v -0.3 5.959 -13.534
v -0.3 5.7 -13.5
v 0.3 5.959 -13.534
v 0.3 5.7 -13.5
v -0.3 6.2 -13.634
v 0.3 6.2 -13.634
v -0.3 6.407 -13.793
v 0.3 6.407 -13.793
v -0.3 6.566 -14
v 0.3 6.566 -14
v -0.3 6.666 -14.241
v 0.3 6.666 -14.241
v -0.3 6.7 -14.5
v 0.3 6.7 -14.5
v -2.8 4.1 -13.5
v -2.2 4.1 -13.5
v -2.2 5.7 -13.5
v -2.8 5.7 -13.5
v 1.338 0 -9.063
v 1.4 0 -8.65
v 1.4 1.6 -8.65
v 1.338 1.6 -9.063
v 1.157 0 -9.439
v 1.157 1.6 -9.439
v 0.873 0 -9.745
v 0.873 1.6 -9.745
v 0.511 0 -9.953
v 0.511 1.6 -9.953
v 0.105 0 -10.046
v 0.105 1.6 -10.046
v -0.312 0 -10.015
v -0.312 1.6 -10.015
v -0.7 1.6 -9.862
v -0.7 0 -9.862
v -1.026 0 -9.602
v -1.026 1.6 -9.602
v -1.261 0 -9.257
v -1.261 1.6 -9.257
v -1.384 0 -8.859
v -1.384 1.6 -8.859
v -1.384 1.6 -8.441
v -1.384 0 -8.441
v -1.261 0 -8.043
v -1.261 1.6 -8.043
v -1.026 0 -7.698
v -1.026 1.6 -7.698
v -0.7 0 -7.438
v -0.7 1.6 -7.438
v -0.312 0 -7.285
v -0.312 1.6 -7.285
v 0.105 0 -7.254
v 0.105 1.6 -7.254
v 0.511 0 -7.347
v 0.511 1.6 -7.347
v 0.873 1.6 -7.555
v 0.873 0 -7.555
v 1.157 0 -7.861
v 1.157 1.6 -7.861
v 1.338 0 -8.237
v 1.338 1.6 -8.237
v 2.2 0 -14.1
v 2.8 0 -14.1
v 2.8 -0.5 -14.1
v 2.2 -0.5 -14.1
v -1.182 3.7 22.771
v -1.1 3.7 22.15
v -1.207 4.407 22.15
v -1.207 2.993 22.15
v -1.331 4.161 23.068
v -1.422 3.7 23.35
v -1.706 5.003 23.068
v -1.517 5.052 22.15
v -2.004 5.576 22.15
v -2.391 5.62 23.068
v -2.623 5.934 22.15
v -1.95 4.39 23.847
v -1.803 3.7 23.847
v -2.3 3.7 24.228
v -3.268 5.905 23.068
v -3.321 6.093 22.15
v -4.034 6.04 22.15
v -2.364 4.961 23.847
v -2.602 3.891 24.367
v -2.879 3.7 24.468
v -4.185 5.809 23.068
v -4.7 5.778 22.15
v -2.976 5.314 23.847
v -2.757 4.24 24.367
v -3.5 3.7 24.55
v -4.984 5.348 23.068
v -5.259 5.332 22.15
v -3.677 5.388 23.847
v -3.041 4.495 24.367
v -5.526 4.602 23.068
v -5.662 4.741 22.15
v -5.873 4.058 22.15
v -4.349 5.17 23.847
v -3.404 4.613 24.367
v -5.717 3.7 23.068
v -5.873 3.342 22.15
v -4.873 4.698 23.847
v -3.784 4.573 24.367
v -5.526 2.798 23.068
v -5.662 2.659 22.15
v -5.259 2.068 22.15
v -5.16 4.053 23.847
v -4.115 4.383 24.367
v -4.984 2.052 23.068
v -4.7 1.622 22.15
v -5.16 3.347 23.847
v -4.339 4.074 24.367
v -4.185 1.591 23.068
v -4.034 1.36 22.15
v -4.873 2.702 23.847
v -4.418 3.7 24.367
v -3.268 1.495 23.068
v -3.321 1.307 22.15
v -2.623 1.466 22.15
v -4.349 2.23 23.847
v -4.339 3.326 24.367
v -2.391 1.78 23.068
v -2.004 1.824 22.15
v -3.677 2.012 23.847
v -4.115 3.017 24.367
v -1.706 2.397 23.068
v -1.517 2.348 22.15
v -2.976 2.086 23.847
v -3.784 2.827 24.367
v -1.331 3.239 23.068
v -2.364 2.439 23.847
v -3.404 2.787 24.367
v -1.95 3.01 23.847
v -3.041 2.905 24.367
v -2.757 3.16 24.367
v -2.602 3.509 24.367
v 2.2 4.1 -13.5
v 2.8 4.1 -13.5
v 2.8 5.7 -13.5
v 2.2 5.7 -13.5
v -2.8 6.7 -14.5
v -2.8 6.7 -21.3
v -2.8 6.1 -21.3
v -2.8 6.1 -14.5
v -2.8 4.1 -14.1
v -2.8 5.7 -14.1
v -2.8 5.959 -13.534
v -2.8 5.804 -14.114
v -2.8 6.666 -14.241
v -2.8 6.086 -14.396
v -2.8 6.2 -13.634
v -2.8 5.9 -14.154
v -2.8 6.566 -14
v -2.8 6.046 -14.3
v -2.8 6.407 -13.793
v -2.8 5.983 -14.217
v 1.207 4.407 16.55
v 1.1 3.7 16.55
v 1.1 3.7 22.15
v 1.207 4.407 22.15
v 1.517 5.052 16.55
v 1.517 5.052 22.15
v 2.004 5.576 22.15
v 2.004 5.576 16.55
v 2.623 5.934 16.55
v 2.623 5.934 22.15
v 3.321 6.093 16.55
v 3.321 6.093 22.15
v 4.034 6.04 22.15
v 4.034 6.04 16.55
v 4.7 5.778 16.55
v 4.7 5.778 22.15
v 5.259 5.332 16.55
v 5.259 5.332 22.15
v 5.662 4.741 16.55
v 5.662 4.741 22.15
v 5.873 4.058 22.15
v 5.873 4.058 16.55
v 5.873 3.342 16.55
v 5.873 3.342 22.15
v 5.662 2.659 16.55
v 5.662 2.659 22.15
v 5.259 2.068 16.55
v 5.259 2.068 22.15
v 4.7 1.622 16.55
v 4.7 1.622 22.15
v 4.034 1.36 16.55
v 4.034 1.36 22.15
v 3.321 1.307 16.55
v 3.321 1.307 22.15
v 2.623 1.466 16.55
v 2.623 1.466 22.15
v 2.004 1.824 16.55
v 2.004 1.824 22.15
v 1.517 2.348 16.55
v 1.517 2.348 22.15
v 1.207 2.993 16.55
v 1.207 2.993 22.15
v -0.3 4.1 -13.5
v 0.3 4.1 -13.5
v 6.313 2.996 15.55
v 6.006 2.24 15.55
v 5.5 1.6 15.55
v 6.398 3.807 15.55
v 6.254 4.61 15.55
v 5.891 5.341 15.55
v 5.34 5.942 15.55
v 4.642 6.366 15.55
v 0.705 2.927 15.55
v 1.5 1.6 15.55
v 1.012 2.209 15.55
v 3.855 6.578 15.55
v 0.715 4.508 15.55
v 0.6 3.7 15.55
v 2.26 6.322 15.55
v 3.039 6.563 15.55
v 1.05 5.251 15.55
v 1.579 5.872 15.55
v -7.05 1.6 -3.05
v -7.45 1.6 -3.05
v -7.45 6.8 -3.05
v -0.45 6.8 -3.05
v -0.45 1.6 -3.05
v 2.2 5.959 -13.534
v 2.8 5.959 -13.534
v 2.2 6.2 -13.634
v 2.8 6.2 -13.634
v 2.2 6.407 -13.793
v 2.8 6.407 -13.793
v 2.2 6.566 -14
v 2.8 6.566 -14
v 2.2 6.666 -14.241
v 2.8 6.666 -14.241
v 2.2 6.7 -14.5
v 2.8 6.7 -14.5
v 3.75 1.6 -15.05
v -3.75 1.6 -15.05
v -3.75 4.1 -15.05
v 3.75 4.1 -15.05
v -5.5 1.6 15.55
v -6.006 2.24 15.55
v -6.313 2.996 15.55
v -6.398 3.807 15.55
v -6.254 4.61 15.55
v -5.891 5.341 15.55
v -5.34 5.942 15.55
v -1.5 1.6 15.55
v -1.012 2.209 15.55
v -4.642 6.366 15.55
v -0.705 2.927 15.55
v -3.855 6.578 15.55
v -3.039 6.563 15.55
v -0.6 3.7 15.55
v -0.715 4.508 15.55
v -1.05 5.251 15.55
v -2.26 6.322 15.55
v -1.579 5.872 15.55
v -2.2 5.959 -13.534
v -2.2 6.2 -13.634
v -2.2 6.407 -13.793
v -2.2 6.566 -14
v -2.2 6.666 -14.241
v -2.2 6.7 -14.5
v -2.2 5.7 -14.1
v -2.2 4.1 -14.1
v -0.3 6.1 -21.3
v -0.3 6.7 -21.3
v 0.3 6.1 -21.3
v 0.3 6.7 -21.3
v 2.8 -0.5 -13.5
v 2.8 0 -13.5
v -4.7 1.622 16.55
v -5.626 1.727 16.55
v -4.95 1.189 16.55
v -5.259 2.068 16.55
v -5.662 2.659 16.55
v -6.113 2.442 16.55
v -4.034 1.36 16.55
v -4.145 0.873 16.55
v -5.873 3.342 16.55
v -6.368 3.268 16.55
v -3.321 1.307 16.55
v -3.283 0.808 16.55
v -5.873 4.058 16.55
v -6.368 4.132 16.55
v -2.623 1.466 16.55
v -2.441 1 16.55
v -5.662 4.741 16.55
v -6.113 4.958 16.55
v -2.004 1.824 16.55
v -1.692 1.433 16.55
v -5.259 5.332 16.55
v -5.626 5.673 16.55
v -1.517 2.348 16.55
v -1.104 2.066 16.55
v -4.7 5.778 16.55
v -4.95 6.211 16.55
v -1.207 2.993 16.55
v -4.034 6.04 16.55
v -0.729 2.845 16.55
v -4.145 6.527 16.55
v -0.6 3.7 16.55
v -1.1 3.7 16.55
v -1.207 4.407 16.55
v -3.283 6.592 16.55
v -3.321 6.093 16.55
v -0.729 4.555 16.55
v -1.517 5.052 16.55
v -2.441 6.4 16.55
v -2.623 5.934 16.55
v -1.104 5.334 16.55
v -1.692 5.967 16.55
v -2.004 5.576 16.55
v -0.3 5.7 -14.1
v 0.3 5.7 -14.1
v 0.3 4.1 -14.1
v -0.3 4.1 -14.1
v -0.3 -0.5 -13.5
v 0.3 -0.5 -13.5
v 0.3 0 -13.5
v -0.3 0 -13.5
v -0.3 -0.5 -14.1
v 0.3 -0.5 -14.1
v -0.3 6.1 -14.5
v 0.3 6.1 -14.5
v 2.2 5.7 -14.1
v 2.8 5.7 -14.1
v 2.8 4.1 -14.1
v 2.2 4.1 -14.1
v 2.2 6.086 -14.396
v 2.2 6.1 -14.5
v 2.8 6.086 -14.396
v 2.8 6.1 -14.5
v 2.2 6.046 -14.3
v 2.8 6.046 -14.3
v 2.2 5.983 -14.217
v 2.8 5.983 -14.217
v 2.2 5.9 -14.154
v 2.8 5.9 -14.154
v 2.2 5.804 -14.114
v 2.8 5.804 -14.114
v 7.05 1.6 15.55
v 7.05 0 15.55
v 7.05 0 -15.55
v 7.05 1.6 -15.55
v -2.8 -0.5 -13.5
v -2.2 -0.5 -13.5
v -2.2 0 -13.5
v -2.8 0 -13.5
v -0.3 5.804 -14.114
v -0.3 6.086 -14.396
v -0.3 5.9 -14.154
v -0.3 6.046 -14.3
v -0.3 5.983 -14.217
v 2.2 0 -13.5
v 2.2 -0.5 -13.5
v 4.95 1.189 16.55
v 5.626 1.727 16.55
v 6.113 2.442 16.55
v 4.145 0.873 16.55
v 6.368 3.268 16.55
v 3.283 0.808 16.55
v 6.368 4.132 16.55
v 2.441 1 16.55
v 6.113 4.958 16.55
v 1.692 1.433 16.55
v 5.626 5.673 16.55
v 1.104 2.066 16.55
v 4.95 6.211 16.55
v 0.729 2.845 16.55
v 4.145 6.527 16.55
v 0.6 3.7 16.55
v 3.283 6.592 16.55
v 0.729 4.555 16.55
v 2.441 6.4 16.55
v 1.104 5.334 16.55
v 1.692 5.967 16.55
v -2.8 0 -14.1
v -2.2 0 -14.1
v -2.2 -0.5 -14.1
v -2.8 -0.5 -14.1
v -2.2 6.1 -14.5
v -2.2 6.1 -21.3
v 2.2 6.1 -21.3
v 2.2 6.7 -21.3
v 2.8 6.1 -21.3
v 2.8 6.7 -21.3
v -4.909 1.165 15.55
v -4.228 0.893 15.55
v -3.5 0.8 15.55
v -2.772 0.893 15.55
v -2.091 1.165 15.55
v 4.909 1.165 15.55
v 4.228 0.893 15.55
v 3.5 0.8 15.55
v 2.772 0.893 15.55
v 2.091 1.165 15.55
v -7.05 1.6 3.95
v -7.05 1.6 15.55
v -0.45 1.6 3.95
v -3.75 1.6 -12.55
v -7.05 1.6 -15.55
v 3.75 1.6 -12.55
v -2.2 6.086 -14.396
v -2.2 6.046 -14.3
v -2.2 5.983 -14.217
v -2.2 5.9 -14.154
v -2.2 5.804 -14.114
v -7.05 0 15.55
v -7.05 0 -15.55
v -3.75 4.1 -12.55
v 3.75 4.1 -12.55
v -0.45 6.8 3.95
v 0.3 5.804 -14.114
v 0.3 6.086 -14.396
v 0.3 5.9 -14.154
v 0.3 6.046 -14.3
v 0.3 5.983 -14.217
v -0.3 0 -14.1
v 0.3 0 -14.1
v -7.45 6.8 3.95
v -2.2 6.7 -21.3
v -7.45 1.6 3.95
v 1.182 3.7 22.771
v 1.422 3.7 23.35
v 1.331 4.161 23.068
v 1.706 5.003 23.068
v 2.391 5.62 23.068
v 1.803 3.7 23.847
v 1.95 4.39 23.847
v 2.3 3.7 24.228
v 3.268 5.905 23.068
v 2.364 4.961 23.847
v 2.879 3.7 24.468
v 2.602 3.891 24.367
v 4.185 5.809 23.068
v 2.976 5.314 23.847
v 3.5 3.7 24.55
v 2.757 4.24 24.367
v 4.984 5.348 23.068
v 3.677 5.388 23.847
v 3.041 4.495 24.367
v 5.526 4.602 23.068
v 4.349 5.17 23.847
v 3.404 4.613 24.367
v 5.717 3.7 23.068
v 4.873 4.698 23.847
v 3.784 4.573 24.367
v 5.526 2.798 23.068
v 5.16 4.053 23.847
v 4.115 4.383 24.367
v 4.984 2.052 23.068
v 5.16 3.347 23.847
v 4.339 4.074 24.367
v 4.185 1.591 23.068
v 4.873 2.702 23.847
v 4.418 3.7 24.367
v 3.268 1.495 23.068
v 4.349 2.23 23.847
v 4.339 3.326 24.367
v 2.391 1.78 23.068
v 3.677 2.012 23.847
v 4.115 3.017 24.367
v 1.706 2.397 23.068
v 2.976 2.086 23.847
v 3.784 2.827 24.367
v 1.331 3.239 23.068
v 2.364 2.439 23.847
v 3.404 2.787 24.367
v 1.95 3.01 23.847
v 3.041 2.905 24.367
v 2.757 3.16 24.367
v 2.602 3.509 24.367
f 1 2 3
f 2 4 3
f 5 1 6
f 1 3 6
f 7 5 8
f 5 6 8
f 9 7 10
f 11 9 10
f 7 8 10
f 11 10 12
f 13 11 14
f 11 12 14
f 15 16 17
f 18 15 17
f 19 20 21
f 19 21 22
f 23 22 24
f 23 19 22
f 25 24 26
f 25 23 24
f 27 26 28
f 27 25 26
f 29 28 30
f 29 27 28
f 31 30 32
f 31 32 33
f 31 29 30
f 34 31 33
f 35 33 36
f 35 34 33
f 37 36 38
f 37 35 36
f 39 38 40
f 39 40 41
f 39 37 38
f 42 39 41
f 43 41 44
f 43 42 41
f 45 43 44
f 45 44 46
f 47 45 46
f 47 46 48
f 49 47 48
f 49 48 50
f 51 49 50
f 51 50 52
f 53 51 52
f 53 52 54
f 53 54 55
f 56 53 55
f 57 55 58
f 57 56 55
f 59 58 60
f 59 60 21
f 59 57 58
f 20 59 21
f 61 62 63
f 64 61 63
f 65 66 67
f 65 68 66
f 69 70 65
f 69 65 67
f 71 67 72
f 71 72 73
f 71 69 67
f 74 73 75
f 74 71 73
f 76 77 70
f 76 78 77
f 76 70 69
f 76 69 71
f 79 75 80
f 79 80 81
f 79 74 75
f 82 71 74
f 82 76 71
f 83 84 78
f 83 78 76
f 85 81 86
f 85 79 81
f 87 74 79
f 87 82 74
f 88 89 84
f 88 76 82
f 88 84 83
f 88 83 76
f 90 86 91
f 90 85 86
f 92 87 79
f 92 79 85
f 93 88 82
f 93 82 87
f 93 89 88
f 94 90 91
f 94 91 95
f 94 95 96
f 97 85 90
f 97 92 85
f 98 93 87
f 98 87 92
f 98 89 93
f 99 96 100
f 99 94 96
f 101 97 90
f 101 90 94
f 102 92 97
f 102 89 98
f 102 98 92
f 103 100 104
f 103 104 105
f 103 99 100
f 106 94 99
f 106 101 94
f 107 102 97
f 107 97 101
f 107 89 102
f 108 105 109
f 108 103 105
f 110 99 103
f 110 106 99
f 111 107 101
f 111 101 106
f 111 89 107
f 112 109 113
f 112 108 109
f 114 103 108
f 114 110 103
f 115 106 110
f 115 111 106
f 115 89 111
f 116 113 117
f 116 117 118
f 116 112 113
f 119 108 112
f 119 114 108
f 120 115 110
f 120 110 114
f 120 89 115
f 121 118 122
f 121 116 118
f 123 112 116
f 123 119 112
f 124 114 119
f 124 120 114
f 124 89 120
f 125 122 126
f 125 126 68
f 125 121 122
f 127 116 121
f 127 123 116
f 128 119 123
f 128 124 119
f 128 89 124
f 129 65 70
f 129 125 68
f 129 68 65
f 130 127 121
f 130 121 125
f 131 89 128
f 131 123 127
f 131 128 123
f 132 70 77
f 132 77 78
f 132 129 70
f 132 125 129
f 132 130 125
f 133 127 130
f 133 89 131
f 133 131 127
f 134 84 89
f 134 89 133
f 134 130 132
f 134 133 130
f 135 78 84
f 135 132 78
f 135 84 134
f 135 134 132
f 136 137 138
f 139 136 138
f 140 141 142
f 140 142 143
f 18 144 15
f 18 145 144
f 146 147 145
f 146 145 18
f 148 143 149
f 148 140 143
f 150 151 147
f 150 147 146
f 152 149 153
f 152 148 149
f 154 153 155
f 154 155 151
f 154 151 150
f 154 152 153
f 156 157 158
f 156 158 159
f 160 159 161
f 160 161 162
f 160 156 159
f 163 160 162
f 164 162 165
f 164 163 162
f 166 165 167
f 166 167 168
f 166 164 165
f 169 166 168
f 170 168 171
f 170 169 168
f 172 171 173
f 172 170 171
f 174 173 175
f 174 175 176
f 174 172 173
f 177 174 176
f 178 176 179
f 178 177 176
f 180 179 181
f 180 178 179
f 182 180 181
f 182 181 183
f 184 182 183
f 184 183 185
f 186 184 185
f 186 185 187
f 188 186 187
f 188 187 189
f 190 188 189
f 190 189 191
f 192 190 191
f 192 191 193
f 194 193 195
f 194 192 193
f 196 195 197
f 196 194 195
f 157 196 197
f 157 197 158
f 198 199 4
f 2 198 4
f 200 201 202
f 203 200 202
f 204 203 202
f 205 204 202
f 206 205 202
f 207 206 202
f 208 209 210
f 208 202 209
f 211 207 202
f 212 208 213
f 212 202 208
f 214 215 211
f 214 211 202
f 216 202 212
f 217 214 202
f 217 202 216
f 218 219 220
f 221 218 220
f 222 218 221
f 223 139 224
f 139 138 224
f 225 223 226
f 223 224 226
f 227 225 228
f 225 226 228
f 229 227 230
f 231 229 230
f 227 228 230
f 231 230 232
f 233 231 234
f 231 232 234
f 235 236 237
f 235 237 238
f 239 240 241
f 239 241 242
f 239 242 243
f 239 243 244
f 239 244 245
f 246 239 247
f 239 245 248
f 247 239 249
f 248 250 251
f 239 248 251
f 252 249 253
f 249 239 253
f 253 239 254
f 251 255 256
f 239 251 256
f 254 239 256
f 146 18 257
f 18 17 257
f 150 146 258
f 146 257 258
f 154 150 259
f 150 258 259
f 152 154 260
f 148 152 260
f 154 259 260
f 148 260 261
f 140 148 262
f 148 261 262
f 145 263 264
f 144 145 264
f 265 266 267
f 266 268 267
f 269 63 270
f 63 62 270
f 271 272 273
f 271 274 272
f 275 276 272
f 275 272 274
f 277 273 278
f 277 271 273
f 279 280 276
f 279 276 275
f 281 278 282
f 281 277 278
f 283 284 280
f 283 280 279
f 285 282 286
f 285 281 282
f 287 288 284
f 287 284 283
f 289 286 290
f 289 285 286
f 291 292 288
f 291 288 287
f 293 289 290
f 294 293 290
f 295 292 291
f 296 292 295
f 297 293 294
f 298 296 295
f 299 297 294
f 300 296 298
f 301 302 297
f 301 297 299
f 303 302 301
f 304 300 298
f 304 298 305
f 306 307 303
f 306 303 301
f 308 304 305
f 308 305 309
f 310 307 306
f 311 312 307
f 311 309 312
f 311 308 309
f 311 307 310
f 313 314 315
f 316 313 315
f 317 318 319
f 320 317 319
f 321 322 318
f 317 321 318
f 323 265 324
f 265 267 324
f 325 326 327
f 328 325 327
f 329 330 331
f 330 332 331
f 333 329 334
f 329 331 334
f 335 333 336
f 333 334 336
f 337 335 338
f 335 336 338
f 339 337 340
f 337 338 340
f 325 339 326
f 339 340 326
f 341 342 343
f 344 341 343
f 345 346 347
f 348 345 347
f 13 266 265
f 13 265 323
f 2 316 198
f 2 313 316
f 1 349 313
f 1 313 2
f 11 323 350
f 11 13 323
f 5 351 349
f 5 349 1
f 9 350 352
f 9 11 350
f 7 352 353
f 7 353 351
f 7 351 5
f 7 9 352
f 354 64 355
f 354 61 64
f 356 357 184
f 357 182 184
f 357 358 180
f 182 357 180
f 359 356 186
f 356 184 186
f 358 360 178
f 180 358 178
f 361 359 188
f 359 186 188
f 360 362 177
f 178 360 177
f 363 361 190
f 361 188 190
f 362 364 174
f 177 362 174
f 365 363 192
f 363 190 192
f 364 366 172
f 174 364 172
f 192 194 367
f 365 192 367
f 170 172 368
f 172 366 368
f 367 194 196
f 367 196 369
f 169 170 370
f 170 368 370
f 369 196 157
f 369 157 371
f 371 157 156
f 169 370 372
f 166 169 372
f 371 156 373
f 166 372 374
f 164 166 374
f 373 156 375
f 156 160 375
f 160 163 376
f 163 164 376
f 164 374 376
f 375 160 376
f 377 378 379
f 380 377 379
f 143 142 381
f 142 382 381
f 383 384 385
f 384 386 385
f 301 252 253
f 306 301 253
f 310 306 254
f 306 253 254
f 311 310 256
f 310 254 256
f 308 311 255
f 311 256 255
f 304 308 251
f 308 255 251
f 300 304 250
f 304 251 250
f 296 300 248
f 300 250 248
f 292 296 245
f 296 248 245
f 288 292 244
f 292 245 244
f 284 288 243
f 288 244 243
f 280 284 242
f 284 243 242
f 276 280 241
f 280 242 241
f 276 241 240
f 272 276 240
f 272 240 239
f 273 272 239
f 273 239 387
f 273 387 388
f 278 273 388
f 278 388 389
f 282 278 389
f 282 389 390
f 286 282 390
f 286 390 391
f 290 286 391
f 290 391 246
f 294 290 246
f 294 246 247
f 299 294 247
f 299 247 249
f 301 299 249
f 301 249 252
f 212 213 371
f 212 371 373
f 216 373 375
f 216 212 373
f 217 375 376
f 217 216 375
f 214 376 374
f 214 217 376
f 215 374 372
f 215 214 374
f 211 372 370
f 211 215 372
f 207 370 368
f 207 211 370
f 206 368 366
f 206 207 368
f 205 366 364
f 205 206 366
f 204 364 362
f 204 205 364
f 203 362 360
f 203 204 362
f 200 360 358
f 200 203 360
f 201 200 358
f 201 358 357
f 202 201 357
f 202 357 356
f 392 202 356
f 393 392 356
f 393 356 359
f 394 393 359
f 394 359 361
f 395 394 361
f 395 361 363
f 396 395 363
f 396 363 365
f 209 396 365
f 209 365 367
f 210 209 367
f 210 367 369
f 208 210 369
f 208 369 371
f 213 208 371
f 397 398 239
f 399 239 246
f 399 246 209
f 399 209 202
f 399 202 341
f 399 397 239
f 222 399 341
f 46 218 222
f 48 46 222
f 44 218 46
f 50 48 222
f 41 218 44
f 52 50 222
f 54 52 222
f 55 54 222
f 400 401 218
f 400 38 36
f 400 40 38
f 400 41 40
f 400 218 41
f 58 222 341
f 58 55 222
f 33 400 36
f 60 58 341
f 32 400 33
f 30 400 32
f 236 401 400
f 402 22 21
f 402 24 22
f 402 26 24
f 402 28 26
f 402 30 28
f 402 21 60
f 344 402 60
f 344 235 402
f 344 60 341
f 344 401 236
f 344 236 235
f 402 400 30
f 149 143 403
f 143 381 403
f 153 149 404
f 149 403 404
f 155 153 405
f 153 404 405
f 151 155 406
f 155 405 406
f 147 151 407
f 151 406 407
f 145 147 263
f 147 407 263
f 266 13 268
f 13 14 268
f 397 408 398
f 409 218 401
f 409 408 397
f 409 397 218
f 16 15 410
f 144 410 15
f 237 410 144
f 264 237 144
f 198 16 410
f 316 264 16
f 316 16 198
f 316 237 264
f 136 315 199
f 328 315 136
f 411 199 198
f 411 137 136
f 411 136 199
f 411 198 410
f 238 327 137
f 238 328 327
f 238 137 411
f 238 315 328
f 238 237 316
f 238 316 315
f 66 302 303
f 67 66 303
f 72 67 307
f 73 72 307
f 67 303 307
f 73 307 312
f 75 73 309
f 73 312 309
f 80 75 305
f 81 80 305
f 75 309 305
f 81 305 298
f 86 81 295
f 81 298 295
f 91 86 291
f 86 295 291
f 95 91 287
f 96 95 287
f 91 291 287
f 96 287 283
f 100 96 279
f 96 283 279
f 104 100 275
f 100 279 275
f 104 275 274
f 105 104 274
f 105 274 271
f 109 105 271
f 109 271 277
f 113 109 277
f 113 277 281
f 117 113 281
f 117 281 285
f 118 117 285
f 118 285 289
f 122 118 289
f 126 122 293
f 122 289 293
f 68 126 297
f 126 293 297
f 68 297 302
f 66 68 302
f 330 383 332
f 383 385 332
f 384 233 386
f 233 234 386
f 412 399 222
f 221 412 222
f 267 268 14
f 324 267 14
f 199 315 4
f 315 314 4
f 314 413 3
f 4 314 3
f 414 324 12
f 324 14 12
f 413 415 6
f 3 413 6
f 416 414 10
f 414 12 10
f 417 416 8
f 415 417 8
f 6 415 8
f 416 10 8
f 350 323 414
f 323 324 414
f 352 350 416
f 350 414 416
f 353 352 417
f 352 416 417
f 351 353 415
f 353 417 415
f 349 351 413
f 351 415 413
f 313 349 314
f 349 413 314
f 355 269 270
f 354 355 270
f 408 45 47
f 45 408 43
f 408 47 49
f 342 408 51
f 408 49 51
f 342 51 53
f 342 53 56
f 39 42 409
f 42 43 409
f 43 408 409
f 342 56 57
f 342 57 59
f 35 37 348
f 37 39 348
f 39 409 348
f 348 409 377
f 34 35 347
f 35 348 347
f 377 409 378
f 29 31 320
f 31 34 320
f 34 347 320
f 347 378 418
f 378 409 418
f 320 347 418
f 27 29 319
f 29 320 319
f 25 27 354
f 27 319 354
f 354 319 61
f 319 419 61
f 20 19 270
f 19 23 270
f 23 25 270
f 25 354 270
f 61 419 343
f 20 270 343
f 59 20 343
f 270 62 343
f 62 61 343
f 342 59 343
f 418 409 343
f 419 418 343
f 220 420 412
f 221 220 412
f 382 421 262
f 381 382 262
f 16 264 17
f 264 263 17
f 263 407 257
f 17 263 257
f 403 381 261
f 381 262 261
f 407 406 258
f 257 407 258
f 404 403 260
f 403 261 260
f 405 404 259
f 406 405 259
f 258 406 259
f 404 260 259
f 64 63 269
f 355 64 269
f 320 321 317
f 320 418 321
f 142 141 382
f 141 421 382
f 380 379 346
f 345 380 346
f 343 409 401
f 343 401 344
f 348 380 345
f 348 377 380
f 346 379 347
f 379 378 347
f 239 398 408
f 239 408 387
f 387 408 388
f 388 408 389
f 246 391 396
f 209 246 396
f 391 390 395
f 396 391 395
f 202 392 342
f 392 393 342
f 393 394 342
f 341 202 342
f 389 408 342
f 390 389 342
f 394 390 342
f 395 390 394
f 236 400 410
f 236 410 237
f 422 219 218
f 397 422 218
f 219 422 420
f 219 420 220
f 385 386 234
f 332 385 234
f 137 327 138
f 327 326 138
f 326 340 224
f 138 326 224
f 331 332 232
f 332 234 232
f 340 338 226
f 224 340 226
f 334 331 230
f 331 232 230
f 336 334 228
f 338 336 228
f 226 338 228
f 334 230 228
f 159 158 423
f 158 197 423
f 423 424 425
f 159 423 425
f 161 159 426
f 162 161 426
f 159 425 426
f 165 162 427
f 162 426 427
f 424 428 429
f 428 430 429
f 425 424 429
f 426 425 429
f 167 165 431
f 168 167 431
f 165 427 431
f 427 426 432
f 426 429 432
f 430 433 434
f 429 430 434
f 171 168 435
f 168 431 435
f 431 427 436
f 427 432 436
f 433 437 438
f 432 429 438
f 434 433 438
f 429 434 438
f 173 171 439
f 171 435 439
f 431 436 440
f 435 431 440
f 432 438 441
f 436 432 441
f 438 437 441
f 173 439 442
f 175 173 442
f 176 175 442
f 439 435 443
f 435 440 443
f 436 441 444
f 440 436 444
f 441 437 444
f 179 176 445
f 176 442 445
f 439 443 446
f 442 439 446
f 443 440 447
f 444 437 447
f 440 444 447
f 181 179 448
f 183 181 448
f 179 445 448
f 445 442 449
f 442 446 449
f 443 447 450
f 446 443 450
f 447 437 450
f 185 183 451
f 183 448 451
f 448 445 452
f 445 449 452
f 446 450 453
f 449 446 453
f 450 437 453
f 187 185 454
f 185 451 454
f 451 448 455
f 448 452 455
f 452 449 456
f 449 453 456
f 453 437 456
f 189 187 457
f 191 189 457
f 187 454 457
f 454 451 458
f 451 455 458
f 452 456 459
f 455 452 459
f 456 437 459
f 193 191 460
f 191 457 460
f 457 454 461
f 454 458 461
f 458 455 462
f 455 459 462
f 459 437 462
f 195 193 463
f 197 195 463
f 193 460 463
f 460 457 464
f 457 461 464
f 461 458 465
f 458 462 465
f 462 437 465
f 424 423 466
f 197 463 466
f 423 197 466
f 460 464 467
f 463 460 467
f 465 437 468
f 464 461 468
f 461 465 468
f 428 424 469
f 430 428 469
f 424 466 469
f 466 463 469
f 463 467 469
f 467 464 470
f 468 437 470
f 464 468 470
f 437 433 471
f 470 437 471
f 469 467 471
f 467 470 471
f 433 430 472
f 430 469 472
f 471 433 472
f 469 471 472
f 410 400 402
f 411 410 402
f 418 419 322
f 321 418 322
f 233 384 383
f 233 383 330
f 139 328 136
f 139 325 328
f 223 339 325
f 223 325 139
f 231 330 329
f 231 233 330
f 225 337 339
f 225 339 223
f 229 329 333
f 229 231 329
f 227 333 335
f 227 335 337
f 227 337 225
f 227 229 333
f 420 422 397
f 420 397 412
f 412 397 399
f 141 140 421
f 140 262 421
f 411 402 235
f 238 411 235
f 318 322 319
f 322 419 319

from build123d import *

# Parameters (mm, degrees)
SKETCH_1_W                 = 14.1
SKETCH_1_H                 = 31.1
SKETCH_1_R                 = 1.4
EXTRUDE_1_DEPTH            = 1.6
SKETCH_2_R                 = 2.9
EXTRUDE_2_DEPTH            = 1
SKETCH_3_R                 = 2.4
EXTRUDE_3_DEPTH            = 8
FILLET_1_R                 = 2.4
FILLET_1_OF_MIRROR_1_R     = 2.4
SKETCH_4_W                 = 7
SKETCH_4_H                 = 7
EXTRUDE_4_DEPTH            = 5.2
SKETCH_5_W                 = 2.5
SKETCH_5_H                 = 2.5
EXTRUDE_5_DEPTH            = 2.5
EXTRUDE_6_DEPTH            = 0.3
PATTERN_LINEAR_1_COUNT     = 2
PATTERN_LINEAR_1_PITCH     = 2.5
PATTERN_LINEAR_1_COL_COUNT = 2
PATTERN_LINEAR_1_COL_PITCH = 2.5


with BuildPart() as part:
    # 草图1 → 凸台-拉伸1 (new body)
    with BuildSketch(Plane(origin=(0, 0, 0), x_dir=(1, 0, 0), z_dir=(0, 1, 0))):
        Rectangle(SKETCH_1_W, SKETCH_1_H)
        with Locations((0, 8.65)):
            Circle(SKETCH_1_R, mode=Mode.SUBTRACT)
    extrude(amount=EXTRUDE_1_DEPTH)

    # 草图2 → 凸台-拉伸2 (add)
    with BuildSketch(Plane.XY.offset(15.55)):
        with Locations((-3.5, 3.7)):
            Circle(SKETCH_2_R)
    extrude_2 = extrude(amount=EXTRUDE_2_DEPTH)

    # 草图3 → 凸台-拉伸3 (add)
    with BuildSketch(Plane.XY.offset(16.55)):
        with Locations((-3.5, 3.7)):
            Circle(SKETCH_3_R)
    extrude_3 = extrude(amount=EXTRUDE_3_DEPTH)

    # 圆角1
    fillet_1_edges = [part.edges().sort_by_distance(p)[0] for p in [
        (-5.9, 3.7, 24.55),
    ]]
    fillet(fillet_1_edges, radius=FILLET_1_R)

    # 镜向1: 凸台-拉伸2, 凸台-拉伸3 across plane
    add(extrude_2.mirror(Plane(origin=(0, 0, 0), x_dir=(0, 0, 1), z_dir=(1, 0, 0))))
    add(extrude_3.mirror(Plane(origin=(0, 0, 0), x_dir=(0, 0, 1), z_dir=(1, 0, 0))))

    # 圆角1 of 镜向1
    fillet_1_of_mirror_1_edges = [part.edges().sort_by_distance(p)[0] for p in [
        (5.9, 3.7, 24.55),
    ]]
    fillet(fillet_1_of_mirror_1_edges, radius=FILLET_1_OF_MIRROR_1_R)

    # 草图4 → 凸台-拉伸4 (add)
    with BuildSketch(Plane(origin=(0, 1.6, 0), x_dir=(1, 0, 0), z_dir=(0, 1, 0))):
        with Locations((-3.95, -0.45)):
            Rectangle(SKETCH_4_W, SKETCH_4_H)
    extrude(amount=EXTRUDE_4_DEPTH)

    # 草图5 → 凸台-拉伸5 (add)
    with BuildSketch(Plane(origin=(0, 1.6, 0), x_dir=(1, 0, 0), z_dir=(0, 1, 0))):
        with Locations((0, 13.8)):
            Rectangle(SKETCH_5_W, SKETCH_5_H)
    extrude_5 = extrude(amount=EXTRUDE_5_DEPTH)

    # 草图6 → 凸台-拉伸6 (add, symmetric)
    with BuildSketch(Plane(origin=(0, 0, 0), x_dir=(0, 0, -1), z_dir=(1, 0, 0))):
        with BuildLine():
            Line((13.5, -0.5), (13.5, 5.7))
            ThreePointArc((13.5, 5.7), (13.792893219, 6.407106781), (14.5, 6.7))
            Line((14.5, 6.7), (21.3, 6.7))
            Line((21.3, 6.7), (21.3, 6.1))
            Line((21.3, 6.1), (14.5, 6.1))
            ThreePointArc((14.5, 6.1), (14.217157288, 5.982842712), (14.1, 5.7))
            Line((14.1, 5.7), (14.1, -0.5))
            Line((14.1, -0.5), (13.5, -0.5))
        make_face()
    extrude_6 = extrude(amount=EXTRUDE_6_DEPTH, both=True)

    # 阵列(线性)1: 凸台-拉伸5, 凸台-拉伸6 ×2
    with Locations(*[(-i * PATTERN_LINEAR_1_PITCH, 0, 0) for i in range(1, PATTERN_LINEAR_1_COUNT)]):
        add(extrude_5)
        add(extrude_6)

    # 阵列(线性)1 col: 凸台-拉伸5, 凸台-拉伸6 ×2
    with Locations(*[(i * PATTERN_LINEAR_1_COL_PITCH, 0, 0) for i in range(1, PATTERN_LINEAR_1_COL_COUNT)]):
        add(extrude_5)
        add(extrude_6)


solid = part.part
